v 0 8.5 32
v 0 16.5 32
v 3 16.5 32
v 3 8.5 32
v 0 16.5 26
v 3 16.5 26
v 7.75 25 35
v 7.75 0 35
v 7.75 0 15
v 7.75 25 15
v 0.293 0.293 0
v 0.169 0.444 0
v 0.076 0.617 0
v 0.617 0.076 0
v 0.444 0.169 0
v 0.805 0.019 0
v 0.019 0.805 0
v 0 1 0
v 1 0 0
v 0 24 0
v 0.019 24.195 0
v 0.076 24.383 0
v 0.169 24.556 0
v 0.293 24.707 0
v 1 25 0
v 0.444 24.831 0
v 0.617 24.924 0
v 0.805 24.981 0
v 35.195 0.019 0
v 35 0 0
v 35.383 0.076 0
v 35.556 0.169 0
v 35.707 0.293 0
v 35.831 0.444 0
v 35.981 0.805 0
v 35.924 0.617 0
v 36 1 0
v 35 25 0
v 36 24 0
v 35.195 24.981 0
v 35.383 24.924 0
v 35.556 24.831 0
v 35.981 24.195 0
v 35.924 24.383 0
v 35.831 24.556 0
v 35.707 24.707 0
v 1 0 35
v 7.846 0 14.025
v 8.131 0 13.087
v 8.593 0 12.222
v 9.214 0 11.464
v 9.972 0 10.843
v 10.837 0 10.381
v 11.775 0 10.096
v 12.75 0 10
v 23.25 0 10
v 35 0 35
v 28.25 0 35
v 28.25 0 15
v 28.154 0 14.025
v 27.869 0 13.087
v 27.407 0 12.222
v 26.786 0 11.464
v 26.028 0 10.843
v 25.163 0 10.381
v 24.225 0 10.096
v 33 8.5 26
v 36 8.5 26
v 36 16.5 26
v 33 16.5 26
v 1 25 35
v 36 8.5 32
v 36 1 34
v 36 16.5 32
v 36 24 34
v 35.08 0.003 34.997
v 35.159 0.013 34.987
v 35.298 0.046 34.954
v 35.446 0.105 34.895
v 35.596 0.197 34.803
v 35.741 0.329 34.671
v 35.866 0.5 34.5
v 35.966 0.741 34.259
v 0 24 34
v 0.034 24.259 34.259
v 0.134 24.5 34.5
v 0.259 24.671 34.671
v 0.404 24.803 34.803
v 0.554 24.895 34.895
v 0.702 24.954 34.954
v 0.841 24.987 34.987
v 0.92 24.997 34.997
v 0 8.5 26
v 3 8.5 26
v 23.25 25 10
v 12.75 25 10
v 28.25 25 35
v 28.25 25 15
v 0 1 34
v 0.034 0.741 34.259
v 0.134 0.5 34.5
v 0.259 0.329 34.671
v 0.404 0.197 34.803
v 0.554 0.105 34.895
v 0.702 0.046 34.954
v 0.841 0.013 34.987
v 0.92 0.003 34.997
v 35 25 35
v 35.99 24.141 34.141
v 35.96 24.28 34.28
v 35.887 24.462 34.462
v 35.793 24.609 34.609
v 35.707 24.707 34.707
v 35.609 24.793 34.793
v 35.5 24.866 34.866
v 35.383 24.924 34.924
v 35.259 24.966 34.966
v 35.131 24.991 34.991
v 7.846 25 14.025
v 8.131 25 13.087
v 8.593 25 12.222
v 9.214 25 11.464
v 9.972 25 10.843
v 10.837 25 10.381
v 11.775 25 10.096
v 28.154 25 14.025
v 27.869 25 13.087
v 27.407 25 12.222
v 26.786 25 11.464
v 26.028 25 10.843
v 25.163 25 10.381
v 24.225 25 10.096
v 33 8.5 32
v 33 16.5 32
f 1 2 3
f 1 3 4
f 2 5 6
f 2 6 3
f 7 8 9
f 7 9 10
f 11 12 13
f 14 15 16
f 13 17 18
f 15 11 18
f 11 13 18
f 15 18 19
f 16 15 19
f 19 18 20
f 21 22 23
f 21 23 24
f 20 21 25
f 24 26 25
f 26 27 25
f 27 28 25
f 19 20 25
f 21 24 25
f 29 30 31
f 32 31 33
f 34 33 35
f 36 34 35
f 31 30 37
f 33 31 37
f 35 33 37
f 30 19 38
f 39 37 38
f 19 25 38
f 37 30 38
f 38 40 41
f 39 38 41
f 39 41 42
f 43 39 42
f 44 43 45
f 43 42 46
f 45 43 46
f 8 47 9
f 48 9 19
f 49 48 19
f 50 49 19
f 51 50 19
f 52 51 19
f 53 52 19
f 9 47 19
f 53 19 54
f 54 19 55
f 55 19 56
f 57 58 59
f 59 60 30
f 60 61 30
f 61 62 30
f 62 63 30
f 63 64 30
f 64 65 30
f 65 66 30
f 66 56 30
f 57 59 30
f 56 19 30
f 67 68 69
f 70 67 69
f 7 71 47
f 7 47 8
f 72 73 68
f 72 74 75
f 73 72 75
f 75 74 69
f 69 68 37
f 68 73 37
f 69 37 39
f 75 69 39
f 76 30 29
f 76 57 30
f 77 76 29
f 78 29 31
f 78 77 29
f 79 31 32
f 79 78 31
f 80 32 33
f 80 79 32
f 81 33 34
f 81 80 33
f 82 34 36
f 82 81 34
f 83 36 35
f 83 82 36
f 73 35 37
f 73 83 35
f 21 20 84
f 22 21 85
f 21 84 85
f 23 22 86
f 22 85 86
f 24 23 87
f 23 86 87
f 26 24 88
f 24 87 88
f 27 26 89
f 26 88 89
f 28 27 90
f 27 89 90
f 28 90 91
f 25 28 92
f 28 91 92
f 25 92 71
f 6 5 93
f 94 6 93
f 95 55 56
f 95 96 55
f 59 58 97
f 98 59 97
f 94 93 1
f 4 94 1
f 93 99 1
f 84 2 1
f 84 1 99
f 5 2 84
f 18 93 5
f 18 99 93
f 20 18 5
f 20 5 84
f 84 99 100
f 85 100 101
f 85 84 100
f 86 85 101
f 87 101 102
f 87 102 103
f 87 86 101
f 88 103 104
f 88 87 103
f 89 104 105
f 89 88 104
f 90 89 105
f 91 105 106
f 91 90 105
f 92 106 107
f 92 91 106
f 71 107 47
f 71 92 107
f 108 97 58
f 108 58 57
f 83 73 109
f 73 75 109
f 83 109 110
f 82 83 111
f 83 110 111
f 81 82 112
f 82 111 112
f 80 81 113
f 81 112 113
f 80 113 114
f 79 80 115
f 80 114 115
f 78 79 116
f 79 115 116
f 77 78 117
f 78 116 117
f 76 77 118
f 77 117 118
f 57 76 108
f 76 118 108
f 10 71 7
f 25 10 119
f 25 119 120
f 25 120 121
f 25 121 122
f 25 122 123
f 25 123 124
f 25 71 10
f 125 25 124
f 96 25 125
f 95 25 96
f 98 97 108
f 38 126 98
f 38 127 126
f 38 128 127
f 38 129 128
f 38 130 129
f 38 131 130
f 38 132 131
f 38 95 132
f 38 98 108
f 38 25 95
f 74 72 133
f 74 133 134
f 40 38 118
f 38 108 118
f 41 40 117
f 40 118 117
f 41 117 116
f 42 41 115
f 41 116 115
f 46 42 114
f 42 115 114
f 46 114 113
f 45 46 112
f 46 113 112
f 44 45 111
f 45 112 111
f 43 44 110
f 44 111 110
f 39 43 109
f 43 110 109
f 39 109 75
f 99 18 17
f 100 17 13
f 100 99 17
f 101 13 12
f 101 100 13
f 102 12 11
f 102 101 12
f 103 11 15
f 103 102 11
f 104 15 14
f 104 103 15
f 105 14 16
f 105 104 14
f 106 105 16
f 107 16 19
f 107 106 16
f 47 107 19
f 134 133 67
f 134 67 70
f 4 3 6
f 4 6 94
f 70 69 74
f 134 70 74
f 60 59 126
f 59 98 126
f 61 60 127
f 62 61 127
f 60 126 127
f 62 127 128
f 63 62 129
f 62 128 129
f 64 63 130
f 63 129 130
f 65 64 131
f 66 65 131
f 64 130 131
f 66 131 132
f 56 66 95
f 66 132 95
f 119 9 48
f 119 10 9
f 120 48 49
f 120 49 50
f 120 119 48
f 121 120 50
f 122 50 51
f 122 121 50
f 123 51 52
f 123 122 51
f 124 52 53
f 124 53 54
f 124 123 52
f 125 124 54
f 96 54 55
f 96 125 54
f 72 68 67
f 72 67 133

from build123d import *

# Parameters (mm, degrees)
F0_W     = 36
F0_H     = 25
F1_DEPTH = 35
F2_W     = 20.5
F2_H     = 25
F3_DEPTH = 25
F4_R     = 1
F5_R     = 5
F6_W     = 8
F6_H     = 6
F7_DEPTH = 3
F8_W     = 8
F8_H     = 6
F9_DEPTH = 3


with BuildPart() as f1:
    # F0 (on Top) → F1 (new body)
    with BuildSketch(Plane.XY):
        with Locations((18, 12.5)):
            Rectangle(F0_W, F0_H)
    extrude(amount=F1_DEPTH)

    # F2 (on face) → F3 (cut)
    with BuildSketch(Plane.XY.offset(35)):
        with Locations((18, 12.5)):
            Rectangle(F2_W, F2_H)
    extrude(amount=-F3_DEPTH, mode=Mode.SUBTRACT)

    # F4
    f4_edges = [f1.edges().sort_by_distance(p)[0] for p in [
        (0, 0, 17.5),
        (0, 12.5, 35),
        (0, 25, 17.5),
        (36, 25, 17.5),
        (36, 12.5, 35),
        (36, 0, 17.5),
    ]]
    fillet(f4_edges, radius=F4_R)

    # F5
    f5_edges = [f1.edges().sort_by_distance(p)[0] for p in [
        (7.75, 12.5, 10),
        (28.25, 12.5, 10),
    ]]
    fillet(f5_edges, radius=F5_R)

    # F6 (on face) → F7 (cut)
    with BuildSketch(Plane(origin=(0, 0, 0), x_dir=(0, -1, 0), z_dir=(-1, 0, 0))):
        with Locations((-12.5, 29)):
            Rectangle(F6_W, F6_H)
    extrude(amount=-F7_DEPTH, mode=Mode.SUBTRACT)

    # F8 (on face) → F9 (cut)
    with BuildSketch(Plane.YZ.offset(36)):
        with Locations((12.5, 29)):
            Rectangle(F8_W, F8_H)
    extrude(amount=-F9_DEPTH, mode=Mode.SUBTRACT)


solid = f1.part
